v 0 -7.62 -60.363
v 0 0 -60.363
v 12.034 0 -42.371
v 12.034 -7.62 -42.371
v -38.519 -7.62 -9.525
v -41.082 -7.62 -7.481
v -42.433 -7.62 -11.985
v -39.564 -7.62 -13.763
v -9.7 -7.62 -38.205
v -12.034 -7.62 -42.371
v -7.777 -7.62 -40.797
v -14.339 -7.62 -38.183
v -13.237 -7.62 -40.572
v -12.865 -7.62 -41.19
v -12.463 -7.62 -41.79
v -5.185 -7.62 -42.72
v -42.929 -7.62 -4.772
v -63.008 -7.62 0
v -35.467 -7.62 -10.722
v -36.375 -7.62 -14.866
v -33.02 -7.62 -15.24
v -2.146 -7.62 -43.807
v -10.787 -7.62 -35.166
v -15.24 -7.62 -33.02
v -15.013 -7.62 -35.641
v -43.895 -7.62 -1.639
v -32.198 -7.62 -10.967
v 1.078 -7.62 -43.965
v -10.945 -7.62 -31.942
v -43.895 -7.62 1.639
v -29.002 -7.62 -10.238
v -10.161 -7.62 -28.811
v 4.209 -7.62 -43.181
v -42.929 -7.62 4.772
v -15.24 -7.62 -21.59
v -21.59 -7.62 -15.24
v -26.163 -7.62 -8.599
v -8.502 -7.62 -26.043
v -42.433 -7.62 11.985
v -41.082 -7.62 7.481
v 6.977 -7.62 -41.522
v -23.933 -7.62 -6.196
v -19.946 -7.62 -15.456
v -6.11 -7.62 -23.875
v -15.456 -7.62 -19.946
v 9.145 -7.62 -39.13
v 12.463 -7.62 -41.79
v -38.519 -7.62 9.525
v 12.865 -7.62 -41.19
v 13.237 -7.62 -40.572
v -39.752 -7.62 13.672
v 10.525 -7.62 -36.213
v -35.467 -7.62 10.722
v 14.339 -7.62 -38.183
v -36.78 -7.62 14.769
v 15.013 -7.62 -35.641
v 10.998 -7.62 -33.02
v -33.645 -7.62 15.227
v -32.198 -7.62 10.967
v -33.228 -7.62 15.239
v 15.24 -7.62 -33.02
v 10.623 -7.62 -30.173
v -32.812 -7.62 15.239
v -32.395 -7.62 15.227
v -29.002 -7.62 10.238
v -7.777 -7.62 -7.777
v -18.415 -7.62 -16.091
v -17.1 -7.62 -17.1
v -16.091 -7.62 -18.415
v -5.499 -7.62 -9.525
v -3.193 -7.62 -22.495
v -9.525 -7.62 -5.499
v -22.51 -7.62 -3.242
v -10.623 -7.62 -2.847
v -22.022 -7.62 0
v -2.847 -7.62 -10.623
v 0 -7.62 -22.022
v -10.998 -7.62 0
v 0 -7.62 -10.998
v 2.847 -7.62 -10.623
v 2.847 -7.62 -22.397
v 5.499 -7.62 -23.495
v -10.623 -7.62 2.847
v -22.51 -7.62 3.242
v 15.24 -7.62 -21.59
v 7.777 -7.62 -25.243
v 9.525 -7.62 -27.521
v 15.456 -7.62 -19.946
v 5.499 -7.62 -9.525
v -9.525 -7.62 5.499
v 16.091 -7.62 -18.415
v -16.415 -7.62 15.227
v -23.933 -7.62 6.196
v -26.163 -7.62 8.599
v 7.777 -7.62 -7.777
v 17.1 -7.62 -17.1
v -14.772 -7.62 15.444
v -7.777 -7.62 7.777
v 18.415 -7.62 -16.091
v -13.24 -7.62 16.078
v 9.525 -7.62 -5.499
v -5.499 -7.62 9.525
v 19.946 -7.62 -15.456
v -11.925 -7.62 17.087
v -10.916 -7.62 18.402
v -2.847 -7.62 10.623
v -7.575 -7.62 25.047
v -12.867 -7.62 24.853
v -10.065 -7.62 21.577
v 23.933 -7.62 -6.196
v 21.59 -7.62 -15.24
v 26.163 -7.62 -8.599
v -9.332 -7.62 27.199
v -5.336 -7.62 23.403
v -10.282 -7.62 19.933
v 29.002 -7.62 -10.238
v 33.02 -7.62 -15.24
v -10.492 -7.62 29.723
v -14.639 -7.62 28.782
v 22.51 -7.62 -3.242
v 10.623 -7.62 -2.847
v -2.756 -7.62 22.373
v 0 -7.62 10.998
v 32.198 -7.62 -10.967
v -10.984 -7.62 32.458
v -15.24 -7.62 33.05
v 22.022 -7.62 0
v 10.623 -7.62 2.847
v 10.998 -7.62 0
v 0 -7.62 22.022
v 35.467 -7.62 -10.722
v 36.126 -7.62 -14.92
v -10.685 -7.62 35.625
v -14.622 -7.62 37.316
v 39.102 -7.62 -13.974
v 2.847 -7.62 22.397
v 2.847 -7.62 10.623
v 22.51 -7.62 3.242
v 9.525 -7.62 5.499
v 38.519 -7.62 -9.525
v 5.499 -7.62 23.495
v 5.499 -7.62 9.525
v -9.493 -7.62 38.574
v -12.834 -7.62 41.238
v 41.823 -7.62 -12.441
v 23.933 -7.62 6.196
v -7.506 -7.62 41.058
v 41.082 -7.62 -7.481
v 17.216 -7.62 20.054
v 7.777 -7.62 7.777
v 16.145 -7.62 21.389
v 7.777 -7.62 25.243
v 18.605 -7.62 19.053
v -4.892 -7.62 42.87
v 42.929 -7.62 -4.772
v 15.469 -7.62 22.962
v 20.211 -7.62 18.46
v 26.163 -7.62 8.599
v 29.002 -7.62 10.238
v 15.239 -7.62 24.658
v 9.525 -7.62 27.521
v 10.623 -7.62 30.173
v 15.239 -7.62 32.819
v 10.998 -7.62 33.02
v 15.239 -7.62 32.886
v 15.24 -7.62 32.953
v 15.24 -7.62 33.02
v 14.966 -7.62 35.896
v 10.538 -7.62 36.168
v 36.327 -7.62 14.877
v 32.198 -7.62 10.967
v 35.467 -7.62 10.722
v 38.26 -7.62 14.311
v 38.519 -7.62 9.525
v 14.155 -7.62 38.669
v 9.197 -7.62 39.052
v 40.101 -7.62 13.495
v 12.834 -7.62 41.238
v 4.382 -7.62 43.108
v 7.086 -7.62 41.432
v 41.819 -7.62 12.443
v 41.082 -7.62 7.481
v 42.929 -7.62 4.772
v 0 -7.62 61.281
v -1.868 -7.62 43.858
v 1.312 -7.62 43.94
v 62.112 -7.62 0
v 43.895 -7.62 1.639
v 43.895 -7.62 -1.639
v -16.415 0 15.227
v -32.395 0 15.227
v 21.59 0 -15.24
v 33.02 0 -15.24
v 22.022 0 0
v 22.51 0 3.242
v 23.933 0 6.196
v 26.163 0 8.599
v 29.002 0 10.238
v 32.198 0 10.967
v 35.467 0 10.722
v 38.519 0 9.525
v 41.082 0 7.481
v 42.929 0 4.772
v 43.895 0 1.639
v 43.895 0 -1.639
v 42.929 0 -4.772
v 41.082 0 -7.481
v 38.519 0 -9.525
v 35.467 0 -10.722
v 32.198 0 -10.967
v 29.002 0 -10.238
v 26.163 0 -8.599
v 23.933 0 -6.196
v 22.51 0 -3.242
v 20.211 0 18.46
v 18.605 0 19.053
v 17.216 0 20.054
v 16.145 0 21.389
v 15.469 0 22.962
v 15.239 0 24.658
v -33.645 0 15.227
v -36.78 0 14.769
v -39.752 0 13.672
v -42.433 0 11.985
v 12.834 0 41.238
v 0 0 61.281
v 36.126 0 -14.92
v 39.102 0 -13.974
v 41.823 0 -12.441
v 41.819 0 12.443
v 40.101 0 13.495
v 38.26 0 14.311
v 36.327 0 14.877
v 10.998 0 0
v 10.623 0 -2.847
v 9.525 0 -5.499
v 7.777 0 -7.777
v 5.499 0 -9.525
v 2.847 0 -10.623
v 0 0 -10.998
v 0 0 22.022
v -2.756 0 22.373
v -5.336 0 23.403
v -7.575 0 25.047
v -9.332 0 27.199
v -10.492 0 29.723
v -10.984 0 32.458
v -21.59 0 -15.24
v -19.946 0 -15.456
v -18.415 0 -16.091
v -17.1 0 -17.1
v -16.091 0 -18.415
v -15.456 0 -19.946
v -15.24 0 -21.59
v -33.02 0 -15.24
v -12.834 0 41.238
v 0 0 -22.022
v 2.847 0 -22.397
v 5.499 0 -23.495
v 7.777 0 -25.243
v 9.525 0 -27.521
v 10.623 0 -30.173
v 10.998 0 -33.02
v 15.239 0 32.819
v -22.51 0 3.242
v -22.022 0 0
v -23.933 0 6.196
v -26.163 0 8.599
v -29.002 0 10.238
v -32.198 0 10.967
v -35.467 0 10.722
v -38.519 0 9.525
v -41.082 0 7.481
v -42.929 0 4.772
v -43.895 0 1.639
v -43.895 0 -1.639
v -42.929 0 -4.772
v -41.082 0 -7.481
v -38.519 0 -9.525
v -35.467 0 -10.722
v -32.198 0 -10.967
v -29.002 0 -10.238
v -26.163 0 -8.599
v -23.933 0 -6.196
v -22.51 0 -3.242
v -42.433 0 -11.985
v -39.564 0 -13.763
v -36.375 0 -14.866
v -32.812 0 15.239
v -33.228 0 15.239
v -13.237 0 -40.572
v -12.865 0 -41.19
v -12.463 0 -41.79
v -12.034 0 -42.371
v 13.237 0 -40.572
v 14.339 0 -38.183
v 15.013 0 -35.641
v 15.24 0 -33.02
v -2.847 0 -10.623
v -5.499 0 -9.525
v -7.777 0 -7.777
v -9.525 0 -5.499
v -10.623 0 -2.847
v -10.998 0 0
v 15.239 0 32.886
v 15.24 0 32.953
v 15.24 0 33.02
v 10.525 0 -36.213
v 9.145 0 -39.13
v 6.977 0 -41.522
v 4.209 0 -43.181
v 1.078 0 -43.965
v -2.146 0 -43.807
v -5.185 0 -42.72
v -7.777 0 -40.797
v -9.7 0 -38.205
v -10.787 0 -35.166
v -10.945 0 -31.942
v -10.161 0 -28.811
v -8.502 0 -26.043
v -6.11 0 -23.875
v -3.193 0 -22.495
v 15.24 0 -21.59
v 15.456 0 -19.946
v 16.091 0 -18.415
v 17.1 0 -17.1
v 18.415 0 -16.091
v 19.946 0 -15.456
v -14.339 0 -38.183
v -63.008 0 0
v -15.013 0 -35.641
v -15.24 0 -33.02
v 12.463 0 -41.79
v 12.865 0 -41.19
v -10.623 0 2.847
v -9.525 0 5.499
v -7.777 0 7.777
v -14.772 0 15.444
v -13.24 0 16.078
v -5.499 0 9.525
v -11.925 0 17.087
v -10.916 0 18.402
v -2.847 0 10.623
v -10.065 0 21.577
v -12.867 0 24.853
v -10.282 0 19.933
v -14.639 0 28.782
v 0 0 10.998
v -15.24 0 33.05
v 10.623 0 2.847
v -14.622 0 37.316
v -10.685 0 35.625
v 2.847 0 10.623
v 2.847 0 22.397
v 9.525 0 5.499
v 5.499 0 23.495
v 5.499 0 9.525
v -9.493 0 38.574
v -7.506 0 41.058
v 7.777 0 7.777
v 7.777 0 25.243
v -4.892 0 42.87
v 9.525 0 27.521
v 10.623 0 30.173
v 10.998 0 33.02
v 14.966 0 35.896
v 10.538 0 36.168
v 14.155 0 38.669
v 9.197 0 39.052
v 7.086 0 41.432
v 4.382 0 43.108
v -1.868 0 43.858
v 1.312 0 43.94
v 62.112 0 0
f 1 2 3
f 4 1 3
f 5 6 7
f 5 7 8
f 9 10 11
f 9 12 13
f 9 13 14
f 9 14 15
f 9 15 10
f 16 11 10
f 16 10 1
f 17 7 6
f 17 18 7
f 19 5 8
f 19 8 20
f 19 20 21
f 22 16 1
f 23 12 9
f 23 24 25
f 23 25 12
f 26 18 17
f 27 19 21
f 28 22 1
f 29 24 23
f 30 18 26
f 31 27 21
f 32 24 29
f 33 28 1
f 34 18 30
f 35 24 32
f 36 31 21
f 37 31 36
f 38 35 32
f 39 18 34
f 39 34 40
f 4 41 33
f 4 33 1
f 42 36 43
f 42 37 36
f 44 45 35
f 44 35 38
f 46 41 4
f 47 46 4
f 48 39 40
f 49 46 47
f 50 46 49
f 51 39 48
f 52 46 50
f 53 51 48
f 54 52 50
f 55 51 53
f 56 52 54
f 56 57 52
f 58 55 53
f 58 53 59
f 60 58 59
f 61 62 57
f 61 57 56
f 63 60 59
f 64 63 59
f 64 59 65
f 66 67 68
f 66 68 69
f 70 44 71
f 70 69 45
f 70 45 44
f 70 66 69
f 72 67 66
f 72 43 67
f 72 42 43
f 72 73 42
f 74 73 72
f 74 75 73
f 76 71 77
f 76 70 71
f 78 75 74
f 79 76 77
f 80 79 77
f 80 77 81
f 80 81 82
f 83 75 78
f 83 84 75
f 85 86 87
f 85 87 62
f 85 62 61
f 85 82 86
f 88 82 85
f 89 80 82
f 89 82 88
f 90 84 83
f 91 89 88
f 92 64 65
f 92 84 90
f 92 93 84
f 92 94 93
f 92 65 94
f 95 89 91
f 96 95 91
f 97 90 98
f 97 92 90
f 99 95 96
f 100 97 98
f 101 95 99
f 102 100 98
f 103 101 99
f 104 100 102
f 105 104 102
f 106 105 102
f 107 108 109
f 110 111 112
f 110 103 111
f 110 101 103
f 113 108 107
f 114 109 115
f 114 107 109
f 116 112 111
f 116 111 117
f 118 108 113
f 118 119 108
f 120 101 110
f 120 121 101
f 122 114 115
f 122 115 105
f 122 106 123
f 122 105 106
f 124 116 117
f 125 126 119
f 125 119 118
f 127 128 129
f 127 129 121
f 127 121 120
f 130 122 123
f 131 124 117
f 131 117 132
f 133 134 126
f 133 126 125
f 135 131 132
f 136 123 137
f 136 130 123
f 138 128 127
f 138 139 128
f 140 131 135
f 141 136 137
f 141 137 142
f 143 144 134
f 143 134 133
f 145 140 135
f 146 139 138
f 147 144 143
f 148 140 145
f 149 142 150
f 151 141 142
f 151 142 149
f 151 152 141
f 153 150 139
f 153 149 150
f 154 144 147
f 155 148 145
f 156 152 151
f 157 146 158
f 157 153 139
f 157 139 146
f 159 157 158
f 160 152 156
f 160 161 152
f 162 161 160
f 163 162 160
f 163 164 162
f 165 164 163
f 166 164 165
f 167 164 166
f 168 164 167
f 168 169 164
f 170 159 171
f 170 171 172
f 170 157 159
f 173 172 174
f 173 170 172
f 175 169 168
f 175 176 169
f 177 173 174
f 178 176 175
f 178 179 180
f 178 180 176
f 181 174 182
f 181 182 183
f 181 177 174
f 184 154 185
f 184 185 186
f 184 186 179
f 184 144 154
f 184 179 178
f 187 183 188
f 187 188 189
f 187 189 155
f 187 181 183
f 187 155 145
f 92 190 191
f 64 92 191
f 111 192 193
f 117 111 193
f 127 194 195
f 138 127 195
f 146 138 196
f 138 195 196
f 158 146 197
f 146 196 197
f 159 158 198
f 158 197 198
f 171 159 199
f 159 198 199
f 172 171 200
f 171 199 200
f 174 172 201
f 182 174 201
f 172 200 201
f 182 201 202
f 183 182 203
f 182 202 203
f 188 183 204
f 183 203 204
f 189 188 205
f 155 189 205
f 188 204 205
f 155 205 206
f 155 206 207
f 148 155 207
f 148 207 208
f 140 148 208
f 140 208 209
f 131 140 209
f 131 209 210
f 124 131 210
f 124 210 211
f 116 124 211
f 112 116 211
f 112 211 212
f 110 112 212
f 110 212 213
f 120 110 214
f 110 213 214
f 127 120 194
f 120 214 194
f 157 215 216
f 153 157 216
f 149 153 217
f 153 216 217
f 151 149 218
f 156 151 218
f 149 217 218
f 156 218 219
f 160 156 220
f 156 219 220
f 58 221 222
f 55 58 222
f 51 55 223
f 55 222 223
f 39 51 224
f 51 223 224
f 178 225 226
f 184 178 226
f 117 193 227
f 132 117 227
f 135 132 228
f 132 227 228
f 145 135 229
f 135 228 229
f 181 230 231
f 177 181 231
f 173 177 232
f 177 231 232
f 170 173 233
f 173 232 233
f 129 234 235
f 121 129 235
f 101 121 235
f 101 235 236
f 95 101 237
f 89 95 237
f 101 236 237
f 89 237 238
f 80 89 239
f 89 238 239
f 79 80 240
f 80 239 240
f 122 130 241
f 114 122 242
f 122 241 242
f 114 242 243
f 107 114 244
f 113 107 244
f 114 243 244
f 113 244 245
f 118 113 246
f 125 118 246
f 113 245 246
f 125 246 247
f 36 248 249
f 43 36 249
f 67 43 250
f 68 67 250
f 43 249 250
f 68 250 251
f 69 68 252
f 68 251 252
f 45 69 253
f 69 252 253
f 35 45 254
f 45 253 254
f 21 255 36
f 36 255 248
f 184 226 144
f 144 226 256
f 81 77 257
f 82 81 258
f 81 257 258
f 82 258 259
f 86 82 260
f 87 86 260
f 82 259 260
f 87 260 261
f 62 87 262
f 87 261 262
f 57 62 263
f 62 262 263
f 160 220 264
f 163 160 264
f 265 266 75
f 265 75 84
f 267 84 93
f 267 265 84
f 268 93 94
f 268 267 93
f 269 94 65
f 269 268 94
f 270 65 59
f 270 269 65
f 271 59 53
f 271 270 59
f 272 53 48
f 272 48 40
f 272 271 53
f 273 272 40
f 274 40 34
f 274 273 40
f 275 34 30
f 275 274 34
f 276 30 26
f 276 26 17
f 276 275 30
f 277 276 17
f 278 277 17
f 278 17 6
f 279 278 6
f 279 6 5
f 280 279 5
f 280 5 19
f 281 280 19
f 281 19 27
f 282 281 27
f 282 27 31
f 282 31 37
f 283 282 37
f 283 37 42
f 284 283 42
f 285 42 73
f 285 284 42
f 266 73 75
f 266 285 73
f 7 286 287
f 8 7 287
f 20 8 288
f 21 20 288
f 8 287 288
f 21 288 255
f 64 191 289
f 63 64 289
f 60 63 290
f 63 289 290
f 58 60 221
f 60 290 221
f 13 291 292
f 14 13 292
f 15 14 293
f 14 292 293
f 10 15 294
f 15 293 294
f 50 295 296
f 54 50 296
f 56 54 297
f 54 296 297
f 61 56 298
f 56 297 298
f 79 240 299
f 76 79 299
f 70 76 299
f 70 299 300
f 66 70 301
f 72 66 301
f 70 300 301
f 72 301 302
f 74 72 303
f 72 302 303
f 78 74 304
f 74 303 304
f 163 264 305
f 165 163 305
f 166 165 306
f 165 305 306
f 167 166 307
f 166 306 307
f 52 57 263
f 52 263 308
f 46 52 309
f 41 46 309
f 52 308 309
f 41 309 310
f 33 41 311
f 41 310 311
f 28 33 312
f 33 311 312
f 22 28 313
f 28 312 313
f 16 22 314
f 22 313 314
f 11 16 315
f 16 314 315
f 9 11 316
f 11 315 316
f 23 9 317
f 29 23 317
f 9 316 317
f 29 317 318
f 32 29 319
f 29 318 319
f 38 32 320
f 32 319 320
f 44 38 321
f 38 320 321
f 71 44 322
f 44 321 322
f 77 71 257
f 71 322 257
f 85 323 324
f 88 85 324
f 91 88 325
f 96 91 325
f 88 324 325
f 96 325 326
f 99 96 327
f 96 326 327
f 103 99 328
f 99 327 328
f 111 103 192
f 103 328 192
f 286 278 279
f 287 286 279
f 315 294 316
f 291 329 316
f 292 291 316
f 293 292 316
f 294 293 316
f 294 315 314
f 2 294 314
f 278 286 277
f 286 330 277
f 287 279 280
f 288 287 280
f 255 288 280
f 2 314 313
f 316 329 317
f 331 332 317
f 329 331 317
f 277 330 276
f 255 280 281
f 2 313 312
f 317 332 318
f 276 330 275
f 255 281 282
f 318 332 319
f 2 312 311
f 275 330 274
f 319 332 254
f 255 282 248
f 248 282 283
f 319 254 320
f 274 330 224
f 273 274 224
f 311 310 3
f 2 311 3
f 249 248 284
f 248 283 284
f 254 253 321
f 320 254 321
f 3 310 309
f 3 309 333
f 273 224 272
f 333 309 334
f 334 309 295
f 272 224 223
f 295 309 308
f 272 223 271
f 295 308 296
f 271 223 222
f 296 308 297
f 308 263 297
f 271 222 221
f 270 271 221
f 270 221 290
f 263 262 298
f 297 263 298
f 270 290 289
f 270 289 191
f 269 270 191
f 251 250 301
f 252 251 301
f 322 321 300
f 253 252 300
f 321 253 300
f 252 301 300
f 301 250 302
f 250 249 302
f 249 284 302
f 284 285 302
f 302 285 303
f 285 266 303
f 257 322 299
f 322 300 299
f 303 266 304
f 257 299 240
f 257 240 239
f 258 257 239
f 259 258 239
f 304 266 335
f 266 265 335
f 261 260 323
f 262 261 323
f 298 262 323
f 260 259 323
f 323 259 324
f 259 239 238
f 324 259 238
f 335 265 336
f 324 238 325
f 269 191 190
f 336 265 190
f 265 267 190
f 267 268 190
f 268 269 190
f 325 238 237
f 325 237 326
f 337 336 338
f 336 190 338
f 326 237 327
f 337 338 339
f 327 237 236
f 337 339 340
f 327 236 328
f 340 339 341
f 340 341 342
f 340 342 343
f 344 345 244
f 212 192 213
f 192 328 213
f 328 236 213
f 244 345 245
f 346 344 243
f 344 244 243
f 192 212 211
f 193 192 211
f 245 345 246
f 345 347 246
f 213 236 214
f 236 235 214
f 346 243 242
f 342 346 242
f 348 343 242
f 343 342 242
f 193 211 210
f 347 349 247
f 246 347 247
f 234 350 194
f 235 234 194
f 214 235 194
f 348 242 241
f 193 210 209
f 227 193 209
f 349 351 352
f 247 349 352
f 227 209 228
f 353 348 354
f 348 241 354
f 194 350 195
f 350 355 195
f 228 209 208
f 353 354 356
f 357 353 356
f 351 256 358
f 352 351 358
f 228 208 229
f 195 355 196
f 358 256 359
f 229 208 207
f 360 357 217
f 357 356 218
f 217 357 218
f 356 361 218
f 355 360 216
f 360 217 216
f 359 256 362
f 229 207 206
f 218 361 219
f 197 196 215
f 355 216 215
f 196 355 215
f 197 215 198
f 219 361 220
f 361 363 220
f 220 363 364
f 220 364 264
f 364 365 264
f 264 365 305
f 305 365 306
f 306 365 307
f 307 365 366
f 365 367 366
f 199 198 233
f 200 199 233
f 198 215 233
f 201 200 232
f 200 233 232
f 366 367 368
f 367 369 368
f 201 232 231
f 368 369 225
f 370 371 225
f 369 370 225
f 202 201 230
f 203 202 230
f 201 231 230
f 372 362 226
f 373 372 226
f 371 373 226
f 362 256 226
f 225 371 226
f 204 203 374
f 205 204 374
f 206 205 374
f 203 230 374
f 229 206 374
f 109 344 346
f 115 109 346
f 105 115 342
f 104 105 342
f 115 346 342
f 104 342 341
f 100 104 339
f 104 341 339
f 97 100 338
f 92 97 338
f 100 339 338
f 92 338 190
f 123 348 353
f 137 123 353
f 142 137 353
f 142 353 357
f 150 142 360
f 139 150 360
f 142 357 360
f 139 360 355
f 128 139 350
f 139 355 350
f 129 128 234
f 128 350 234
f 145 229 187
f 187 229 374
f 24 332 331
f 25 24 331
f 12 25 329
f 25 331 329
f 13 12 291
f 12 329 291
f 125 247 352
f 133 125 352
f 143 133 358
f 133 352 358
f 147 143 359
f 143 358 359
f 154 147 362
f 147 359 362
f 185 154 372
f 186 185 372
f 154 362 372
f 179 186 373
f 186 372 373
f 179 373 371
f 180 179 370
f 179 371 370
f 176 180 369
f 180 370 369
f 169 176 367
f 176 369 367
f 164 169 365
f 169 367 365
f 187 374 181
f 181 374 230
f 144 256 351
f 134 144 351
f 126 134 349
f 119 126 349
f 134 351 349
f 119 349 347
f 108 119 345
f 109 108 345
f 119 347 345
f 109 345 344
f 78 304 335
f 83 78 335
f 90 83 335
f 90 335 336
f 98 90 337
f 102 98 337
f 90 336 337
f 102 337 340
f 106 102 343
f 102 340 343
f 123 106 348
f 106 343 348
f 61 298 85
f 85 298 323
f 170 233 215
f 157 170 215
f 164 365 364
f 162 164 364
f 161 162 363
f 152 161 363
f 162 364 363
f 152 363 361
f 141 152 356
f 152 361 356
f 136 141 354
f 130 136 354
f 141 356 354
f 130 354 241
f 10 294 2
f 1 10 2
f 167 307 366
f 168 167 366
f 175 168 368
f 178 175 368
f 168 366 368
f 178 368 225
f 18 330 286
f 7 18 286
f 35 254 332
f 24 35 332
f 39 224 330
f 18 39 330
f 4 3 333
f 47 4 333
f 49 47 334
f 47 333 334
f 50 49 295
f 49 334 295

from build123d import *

# Parameters (mm, degrees)
F0_R     = 10.9982
F1_DEPTH = 7.62


with BuildPart() as f1:
    # F0 (on Front) → F1 (new body)
    with BuildSketch(Plane.XZ):
        with BuildLine():
            ThreePointArc((-10.9982, 0), (-7.7769018008, 7.7769018008), (0, 10.9982))
            Line((0, 10.9982), (0, 17.78))
            ThreePointArc((0, 17.78), (-5.3788561382, 18.7607746829), (-10.0653965385, 21.5768626451))
            ThreePointArc((-10.0653965385, 21.5768626451), (-11.9253757257, 17.0869306915), (-16.4153965312, 15.2271660045))
            Line((-16.4153965312, 15.2271660045), (-32.3946877004, 15.2271660045))
            ThreePointArc((-32.3946877004, 15.2271660045), (-22.0248338019, 10.5529105121), (-17.78, 0))
            Line((-17.78, 0), (-10.9982, 0))
        make_face()
        with BuildLine():
            Line((0, 17.78), (0, 10.9982))
            ThreePointArc((0, 10.9982), (7.7769018008, 7.7769018008), (10.9982, 0))
            Line((10.9982, 0), (17.78, 0))
            ThreePointArc((17.78, 0), (23.4843953598, 11.8882229179), (36.3272236413, 14.8768233097))
            Line((36.3272236413, 14.8768233097), (20.2106650558, 18.459648921))
            ThreePointArc((20.2106650558, 18.459648921), (16.6352486905, 20.6851567), (15.2386749063, 24.6583253))
            Line((15.2386749063, 24.6583253), (15.2386749063, 32.8190345816))
            ThreePointArc((15.2386749063, 32.8190345816), (10.7050195475, 22.1728733534), (0, 17.78))
        make_face()
        with BuildLine():
            ThreePointArc((0, -10.9982), (-7.7769018008, -7.7769018008), (-10.9982, 0))
            Line((-10.9982, 0), (-17.78, 0))
            ThreePointArc((-17.78, 0), (-22.2436926547, -10.7763073453), (-33.02, -15.24))
            Line((-33.02, -15.24), (-21.59, -15.24))
            ThreePointArc((-21.59, -15.24), (-17.0998719395, -17.0998719395), (-15.24, -21.59))
            Line((-15.24, -21.59), (-15.24, -33.02))
            ThreePointArc((-15.24, -33.02), (-10.7763073453, -22.2436926547), (0, -17.78))
            Line((0, -17.78), (0, -10.9982))
        make_face()
        with BuildLine():
            Line((17.78, 0), (10.9982, 0))
            ThreePointArc((10.9982, 0), (7.7769018008, -7.7769018008), (0, -10.9982))
            Line((0, -10.9982), (0, -17.78))
            ThreePointArc((0, -17.78), (10.7763073453, -22.2436926547), (15.24, -33.02))
            Line((15.24, -33.02), (15.24, -21.59))
            ThreePointArc((15.24, -21.59), (17.0998719395, -17.0998719395), (21.59, -15.24))
            Line((21.59, -15.24), (33.02, -15.24))
            ThreePointArc((33.02, -15.24), (22.2436926547, -10.7763073453), (17.78, 0))
        make_face()
        with BuildLine():
            ThreePointArc((-10.0653965385, 21.5768626451), (-5.3788561382, 18.7607746829), (0, 17.78))
            Line((0, 17.78), (0, 22.0218))
            ThreePointArc((0, 22.0218), (-7.5754508533, 25.0467354485), (-10.9838107601, 32.4575905169))
            Line((-10.9838107601, 32.4575905169), (-10.9838107601, 24.8666))
            ThreePointArc((-10.9838107601, 24.8666), (-10.2992675476, 23.2846396517), (-10.0653965385, 21.5768626451))
        make_face()
        with BuildLine():
            Line((0, 22.0218), (0, 17.78))
            ThreePointArc((0, 17.78), (10.7050195475, 22.1728733534), (15.2386749063, 32.8190345816))
            ThreePointArc((15.2386749063, 32.8190345816), (15.239668723, 32.9195151065), (15.24, 33.02))
            ThreePointArc((15.24, 33.02), (14.6261956768, 37.301588493), (12.8342257188, 41.2382875467))
            ThreePointArc((12.8342257188, 41.2382875467), (0, 48.26), (-12.8342257188, 41.2382875467))
            ThreePointArc((-12.8342257188, 41.2382875467), (-15.091092809, 30.894789933), (-10.0653965385, 21.5768626451))
            ThreePointArc((-10.0653965385, 21.5768626451), (-10.2992675476, 23.2846396517), (-10.9838107601, 24.8666))
            Line((-10.9838107601, 24.8666), (-10.9838107601, 32.4575905169))
            ThreePointArc((-10.9838107601, 32.4575905169), (-0.2812967636, 44.0146021015), (10.9982, 33.02))
            ThreePointArc((10.9982, 33.02), (7.7769018008, 25.2430981992), (0, 22.0218))
        make_face()
        with BuildLine():
            ThreePointArc((-33.02, -15.24), (-22.2436926547, -10.7763073453), (-17.78, 0))
            ThreePointArc((-17.78, 0), (-22.0248338019, 10.5529105121), (-32.3946877004, 15.2271660045))
            Line((-32.3946877004, 15.2271660045), (-33.6453122996, 15.2271660045))
            ThreePointArc((-33.6453122996, 15.2271660045), (-38.2946425734, 14.2981028714), (-42.4334579703, 11.985174552))
            ThreePointArc((-42.4334579703, 11.985174552), (-48.26, 0), (-42.4334579703, -11.985174552))
            ThreePointArc((-42.4334579703, -11.985174552), (-38.0001375397, -14.4033270492), (-33.02, -15.24))
        make_face()
        with Locations((-33.02, 0)):
            Circle(F0_R, mode=Mode.SUBTRACT)
        with BuildLine():
            ThreePointArc((36.3272236413, 14.8768233097), (23.4843953598, 11.8882229179), (17.78, 0))
            ThreePointArc((17.78, 0), (22.2436926547, -10.7763073453), (33.02, -15.24))
            ThreePointArc((33.02, -15.24), (37.6384409366, -14.5233468359), (41.8225222525, -12.4407878366))
            ThreePointArc((41.8225222525, -12.4407878366), (46.555287938, -7.0038261283), (48.26, 0))
            ThreePointArc((48.26, 0), (46.5542268134, 7.0058764309), (41.8187526818, 12.4434541525))
            ThreePointArc((41.8187526818, 12.4434541525), (39.1940575837, 13.9333633037), (36.3272236413, 14.8768233097))
        make_face()
        with BuildLine():
            ThreePointArc((44.0182, 0), (33.02, -10.9982), (22.0218, 0))
            ThreePointArc((22.0218, 0), (33.02, 10.9982), (44.0182, 0))
        make_face(mode=Mode.SUBTRACT)
        with BuildLine():
            ThreePointArc((15.24, -33.02), (10.7763073453, -22.2436926547), (0, -17.78))
            ThreePointArc((0, -17.78), (-10.7763073453, -22.2436926547), (-15.24, -33.02))
            ThreePointArc((-15.24, -33.02), (-14.730806545, -36.9265251226), (-13.2372521609, -40.5720033917))
            Line((-13.2372521609, -40.5720033917), (-12.0341089163, -42.370819354))
            ThreePointArc((-12.0341089163, -42.370819354), (0, -48.26), (12.0341089163, -42.370819354))
            Line((12.0341089163, -42.370819354), (13.2372521609, -40.5720033917))
            ThreePointArc((13.2372521609, -40.5720033917), (14.730806545, -36.9265251226), (15.24, -33.02))
        make_face()
        with BuildLine():
            ThreePointArc((10.9982, -33.02), (-7.7769018008, -40.7969018008), (0, -22.0218))
            ThreePointArc((0, -22.0218), (7.7769018008, -25.2430981992), (10.9982, -33.02))
        make_face(mode=Mode.SUBTRACT)
        with BuildLine():
            Line((-33.6453122996, 15.2271660045), (-32.3946877004, 15.2271660045))
            ThreePointArc((-32.3946877004, 15.2271660045), (-33.02, 15.24), (-33.6453122996, 15.2271660045))
        make_face()
        with BuildLine():
            Line((0, 61.2810700441), (-12.8342257188, 41.2382875467))
            ThreePointArc((-12.8342257188, 41.2382875467), (0, 48.26), (12.8342257188, 41.2382875467))
            Line((12.8342257188, 41.2382875467), (0, 61.2810700441))
        make_face()
        with BuildLine():
            Line((-63.0083821844, 0), (-42.4334579703, -11.985174552))
            ThreePointArc((-42.4334579703, -11.985174552), (-48.26, 0), (-42.4334579703, 11.985174552))
            Line((-42.4334579703, 11.985174552), (-63.0083821844, 0))
        make_face()
        with BuildLine():
            Line((62.1118612768, 0), (41.8187526818, 12.4434541525))
            ThreePointArc((41.8187526818, 12.4434541525), (46.5542268134, 7.0058764309), (48.26, 0))
            ThreePointArc((48.26, 0), (46.555287938, -7.0038261283), (41.8225222525, -12.4407878366))
            Line((41.8225222525, -12.4407878366), (62.1118612768, 0))
        make_face()
        with BuildLine():
            ThreePointArc((12.0341089163, -42.370819354), (12.6676500342, -41.4927942622), (13.2372521609, -40.5720033917))
            Line((13.2372521609, -40.5720033917), (12.0341089163, -42.370819354))
        make_face()
        with BuildLine():
            Line((-12.0341089163, -42.370819354), (-13.2372521609, -40.5720033917))
            ThreePointArc((-13.2372521609, -40.5720033917), (-12.6676500342, -41.4927942622), (-12.0341089163, -42.370819354))
        make_face()
        with BuildLine():
            Line((0, -60.3629805593), (12.0341089163, -42.370819354))
            ThreePointArc((12.0341089163, -42.370819354), (0, -48.26), (-12.0341089163, -42.370819354))
            Line((-12.0341089163, -42.370819354), (0, -60.3629805593))
        make_face()
    extrude(amount=F1_DEPTH)


solid = f1.part
